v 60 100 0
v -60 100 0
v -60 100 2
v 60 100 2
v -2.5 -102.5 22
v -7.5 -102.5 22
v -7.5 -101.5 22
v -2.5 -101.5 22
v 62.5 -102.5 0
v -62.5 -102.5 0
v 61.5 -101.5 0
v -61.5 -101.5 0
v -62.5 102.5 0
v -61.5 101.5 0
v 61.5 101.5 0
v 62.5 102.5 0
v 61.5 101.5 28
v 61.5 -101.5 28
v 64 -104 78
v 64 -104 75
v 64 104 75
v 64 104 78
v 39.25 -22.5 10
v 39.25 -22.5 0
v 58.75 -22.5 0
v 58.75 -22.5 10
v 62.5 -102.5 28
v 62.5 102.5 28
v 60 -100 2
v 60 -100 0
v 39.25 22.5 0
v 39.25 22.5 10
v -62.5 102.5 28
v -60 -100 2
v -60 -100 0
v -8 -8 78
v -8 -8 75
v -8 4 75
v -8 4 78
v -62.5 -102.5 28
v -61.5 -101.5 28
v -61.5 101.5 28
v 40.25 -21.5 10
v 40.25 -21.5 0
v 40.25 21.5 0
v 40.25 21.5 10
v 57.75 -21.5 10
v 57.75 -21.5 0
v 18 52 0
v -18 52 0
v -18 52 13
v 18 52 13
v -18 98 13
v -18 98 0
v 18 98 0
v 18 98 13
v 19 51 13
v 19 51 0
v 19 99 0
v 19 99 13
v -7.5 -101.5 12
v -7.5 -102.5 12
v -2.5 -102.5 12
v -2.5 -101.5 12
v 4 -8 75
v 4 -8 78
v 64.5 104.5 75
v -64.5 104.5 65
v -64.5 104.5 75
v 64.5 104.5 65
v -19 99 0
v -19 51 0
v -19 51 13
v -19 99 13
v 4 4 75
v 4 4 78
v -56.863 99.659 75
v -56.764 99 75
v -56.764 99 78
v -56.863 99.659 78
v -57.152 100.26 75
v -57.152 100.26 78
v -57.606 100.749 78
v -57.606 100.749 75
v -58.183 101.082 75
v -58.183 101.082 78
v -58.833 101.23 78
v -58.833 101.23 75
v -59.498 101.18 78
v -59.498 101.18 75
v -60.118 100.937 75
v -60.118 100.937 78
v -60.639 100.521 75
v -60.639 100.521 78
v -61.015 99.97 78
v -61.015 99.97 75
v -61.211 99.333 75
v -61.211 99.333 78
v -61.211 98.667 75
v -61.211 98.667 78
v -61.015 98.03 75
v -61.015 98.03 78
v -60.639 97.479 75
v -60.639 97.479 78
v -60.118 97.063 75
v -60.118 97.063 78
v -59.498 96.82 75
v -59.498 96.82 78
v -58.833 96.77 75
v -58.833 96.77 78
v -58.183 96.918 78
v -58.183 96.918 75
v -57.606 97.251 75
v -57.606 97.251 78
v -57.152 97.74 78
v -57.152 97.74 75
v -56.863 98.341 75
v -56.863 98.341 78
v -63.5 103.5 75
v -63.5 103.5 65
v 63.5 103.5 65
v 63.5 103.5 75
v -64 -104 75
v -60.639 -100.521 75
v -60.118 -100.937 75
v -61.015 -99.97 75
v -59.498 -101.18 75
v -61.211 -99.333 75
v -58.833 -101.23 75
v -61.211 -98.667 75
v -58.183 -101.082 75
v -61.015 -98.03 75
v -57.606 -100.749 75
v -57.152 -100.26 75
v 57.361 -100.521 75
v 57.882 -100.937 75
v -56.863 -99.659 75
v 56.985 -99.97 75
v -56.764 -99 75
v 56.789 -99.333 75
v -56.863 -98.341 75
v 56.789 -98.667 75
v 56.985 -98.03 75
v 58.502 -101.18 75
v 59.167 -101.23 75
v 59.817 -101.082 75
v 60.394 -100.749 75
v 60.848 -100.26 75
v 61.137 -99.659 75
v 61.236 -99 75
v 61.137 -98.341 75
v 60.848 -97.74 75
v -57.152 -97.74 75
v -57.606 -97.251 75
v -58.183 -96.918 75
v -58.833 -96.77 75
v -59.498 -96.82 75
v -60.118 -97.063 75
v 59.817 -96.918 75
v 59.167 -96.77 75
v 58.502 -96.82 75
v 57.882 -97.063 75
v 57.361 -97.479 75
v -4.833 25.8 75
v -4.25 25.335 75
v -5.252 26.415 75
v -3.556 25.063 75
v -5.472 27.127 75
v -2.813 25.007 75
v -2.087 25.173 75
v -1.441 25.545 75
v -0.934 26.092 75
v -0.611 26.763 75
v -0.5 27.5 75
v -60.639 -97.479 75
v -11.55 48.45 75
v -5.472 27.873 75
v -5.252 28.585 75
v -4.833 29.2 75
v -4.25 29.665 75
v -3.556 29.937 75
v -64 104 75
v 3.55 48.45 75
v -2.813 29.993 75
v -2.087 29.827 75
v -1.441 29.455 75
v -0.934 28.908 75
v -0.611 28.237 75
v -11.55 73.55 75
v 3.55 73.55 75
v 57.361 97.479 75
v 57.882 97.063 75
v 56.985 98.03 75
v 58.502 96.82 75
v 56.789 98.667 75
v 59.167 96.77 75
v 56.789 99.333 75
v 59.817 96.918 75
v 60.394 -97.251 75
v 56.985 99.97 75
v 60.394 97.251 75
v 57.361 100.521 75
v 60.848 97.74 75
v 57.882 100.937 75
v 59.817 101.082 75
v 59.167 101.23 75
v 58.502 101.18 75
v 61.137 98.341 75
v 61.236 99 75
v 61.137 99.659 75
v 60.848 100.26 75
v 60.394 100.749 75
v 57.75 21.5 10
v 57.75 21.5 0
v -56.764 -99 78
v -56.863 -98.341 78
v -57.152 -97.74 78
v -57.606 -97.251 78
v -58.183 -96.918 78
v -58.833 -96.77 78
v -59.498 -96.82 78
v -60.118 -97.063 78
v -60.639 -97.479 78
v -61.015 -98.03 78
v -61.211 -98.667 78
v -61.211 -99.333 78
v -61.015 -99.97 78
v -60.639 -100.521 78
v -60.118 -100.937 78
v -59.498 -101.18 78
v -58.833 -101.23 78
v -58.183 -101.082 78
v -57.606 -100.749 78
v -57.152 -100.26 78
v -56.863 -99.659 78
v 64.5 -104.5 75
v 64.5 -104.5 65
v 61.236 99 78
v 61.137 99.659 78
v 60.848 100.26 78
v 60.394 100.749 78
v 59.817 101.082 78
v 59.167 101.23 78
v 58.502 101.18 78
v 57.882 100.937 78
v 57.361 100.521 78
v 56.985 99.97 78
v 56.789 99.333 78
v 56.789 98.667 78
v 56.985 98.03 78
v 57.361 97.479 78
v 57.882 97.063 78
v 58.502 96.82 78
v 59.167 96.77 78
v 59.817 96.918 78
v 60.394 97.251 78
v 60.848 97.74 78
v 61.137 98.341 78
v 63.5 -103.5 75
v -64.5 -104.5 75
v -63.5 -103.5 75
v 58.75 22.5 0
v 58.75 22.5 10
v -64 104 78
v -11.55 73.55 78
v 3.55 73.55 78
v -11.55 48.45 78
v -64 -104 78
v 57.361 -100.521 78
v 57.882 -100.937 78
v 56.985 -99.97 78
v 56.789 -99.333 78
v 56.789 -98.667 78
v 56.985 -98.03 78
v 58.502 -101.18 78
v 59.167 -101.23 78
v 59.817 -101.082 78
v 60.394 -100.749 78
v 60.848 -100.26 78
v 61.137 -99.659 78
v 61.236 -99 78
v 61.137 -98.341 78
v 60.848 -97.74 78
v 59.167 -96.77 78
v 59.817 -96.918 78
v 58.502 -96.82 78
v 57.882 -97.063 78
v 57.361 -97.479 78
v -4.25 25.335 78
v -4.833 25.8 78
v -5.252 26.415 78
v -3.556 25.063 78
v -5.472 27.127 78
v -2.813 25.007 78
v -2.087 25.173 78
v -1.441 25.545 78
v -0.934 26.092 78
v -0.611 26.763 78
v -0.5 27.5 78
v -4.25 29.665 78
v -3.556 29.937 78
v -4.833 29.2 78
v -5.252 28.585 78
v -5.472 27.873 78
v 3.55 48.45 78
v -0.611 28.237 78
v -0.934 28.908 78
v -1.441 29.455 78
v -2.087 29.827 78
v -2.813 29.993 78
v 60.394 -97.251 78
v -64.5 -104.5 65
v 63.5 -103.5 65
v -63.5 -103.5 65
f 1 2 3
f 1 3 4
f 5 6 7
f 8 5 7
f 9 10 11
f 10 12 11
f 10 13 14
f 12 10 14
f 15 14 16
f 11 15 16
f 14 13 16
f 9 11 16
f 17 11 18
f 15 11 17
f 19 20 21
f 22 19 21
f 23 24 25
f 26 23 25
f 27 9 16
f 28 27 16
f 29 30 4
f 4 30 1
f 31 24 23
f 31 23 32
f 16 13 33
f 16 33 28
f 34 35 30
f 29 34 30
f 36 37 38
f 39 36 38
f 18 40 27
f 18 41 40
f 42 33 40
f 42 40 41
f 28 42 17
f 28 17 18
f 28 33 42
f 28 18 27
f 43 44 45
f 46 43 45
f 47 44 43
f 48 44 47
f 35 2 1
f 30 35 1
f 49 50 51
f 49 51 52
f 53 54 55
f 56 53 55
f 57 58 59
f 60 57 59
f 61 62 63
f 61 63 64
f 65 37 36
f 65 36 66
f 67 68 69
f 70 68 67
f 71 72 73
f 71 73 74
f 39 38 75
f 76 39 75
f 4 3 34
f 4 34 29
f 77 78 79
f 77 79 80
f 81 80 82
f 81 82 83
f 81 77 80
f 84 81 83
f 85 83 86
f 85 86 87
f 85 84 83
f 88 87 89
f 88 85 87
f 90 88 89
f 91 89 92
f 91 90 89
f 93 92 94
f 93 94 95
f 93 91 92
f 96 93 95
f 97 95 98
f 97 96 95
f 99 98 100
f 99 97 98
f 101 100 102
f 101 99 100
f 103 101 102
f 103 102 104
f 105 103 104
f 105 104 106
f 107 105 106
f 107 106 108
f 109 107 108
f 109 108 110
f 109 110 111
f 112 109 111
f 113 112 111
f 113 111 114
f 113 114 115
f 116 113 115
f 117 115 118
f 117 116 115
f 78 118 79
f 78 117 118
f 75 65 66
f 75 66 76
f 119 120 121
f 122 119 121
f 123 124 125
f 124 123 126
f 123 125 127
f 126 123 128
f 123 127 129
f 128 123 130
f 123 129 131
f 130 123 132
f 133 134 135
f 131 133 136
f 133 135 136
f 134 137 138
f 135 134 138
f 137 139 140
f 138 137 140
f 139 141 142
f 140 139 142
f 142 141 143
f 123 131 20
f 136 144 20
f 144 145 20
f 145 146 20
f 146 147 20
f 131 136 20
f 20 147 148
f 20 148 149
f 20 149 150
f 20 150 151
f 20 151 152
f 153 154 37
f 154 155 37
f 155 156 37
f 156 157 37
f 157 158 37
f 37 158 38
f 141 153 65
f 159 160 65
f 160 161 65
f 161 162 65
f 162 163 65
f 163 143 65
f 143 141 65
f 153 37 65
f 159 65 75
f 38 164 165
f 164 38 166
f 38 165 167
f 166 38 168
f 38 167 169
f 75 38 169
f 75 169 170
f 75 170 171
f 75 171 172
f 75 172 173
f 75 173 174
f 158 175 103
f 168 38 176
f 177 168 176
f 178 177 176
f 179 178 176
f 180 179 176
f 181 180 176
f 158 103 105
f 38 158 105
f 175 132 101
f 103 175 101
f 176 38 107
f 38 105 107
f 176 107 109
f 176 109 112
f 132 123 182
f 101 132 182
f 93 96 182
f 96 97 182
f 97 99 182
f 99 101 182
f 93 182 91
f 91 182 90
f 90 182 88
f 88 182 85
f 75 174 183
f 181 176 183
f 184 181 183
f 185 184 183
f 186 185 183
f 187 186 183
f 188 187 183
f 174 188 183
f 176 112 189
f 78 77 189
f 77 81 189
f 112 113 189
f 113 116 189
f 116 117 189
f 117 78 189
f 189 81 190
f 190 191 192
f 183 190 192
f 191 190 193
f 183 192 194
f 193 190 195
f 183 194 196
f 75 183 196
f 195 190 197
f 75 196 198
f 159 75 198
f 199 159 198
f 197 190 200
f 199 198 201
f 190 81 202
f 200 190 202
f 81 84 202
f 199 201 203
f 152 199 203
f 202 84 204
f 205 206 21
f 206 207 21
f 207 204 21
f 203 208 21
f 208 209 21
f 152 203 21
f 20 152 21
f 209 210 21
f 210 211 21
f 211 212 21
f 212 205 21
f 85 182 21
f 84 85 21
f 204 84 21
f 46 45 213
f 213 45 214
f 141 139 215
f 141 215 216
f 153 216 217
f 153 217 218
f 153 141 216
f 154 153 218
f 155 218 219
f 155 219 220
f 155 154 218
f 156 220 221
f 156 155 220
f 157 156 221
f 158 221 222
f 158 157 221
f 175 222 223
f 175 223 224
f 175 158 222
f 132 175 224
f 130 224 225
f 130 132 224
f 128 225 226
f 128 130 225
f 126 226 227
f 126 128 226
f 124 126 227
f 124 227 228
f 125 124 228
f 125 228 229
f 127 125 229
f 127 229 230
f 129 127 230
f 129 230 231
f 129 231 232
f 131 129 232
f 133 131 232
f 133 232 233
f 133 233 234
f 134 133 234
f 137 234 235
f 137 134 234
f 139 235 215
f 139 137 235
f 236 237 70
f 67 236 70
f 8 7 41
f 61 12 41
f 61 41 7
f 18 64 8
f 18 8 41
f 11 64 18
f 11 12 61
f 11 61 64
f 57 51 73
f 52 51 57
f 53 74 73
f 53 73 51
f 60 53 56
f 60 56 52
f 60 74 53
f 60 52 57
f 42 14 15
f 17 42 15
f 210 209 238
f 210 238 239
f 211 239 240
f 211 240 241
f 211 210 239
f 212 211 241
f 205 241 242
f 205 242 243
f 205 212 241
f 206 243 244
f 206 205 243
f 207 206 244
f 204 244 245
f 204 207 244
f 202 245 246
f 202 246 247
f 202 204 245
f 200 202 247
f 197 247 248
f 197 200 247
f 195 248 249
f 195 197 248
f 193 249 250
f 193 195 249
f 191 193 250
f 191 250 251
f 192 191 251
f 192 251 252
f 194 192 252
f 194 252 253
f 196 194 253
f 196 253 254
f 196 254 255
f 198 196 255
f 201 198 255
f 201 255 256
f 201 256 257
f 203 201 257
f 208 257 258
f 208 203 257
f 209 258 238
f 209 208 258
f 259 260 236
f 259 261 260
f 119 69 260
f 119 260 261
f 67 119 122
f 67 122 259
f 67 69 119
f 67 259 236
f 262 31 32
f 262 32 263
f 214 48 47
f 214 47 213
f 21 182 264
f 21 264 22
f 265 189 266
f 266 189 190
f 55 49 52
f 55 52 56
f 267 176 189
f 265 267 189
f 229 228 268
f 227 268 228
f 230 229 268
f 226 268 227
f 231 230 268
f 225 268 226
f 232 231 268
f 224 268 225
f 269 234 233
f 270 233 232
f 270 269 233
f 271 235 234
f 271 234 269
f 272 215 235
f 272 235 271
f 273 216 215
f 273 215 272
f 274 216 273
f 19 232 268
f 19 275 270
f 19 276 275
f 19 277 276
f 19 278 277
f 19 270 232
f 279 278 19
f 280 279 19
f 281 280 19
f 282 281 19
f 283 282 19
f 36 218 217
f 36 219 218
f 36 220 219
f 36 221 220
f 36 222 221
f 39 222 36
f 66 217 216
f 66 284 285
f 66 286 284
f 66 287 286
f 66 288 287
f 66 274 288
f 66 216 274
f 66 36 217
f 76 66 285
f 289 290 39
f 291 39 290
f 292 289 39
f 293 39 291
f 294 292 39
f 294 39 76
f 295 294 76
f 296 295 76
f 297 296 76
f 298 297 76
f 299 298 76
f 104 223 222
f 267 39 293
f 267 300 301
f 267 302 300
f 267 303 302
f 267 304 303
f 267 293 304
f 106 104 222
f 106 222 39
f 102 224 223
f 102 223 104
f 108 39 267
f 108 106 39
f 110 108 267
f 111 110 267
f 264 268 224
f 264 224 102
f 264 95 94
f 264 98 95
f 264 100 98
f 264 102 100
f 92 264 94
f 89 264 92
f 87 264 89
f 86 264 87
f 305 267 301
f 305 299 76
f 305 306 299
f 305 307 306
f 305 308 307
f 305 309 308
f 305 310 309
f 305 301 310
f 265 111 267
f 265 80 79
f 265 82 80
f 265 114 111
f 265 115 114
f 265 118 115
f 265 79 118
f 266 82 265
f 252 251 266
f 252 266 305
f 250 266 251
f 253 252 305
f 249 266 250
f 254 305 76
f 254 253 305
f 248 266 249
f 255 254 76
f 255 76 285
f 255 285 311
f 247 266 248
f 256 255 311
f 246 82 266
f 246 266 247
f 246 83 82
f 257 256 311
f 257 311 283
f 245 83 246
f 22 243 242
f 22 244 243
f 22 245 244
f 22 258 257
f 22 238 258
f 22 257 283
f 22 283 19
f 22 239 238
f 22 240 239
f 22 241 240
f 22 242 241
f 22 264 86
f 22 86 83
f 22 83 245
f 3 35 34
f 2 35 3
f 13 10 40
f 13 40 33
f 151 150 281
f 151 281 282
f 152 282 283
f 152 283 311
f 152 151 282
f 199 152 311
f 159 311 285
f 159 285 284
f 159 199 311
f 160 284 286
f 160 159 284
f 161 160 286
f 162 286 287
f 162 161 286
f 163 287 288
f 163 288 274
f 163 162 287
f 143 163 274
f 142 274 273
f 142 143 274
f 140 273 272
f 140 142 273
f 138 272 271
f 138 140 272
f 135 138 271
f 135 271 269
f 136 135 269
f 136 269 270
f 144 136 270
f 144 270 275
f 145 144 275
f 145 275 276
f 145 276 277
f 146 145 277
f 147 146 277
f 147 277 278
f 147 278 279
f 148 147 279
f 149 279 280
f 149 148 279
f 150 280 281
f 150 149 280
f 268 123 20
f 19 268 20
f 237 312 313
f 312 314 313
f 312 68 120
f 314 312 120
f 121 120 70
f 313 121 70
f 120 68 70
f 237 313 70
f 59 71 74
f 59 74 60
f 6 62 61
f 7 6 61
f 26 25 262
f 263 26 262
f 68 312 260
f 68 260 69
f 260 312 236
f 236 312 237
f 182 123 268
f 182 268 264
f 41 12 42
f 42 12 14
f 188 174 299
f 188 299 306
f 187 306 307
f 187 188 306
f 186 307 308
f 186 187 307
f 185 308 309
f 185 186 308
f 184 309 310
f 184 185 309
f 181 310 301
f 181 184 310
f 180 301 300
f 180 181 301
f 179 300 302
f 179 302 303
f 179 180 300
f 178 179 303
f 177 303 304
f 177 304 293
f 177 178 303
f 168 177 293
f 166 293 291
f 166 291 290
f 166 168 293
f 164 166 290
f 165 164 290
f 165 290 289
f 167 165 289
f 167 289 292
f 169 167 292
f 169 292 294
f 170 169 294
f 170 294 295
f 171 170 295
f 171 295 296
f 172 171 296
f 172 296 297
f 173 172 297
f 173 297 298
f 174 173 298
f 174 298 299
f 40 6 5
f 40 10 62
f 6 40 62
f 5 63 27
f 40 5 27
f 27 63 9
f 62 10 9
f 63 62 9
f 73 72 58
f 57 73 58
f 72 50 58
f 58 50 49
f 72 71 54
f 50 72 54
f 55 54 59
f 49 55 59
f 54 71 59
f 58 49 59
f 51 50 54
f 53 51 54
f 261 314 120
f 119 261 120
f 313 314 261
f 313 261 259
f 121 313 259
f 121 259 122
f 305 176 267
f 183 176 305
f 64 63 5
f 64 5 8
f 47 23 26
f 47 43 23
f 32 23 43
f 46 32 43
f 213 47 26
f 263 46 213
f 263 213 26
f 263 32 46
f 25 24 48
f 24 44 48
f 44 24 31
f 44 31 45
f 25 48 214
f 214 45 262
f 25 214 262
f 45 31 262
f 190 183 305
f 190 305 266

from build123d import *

# Parameters (mm, degrees)
SKETCH_W                = 38
SKETCH_H                = 48
SKETCH_W_2              = 36
SKETCH_H_2              = 46
PAD_DEPTH               = 13
SKETCH001_W             = 120
SKETCH001_H             = 200
PAD001_DEPTH            = 2
SKETCH003_W             = 19.5
SKETCH003_H             = 45
SKETCH003_W_2           = 17.5
SKETCH003_H_2           = 43
PAD002_DEPTH            = 10
SKETCH006_W             = 1
SKETCH006_H             = 5
PAD005_DEPTH            = 10
BODY007_PLACEMENT_ANGLE = 90
SKETCH004_W             = 125
SKETCH004_H             = 205
SKETCH004_W_2           = 123
SKETCH004_H_2           = 203
PAD003_DEPTH            = 28
SKETCH007_W             = 129
SKETCH007_H             = 209
SKETCH007_W_2           = 127
SKETCH007_H_2           = 207
PAD006_DEPTH            = 10
SKETCH011_R             = 2.5
PAD010_DEPTH            = 10
SKETCH010_W             = 12
SKETCH010_H             = 12
PAD009_DEPTH            = 10
SKETCH009_W             = 15.1
SKETCH009_H             = 25.1
PAD008_DEPTH            = 3
SKETCH008_W             = 128
SKETCH008_H             = 208
SKETCH008_R             = 2.236466
PAD007_DEPTH            = 3


with BuildPart() as body:
    # Sketch → Pad (new body)
    with BuildSketch(Plane.XY):
        Rectangle(SKETCH_W, SKETCH_H)
        Rectangle(SKETCH_W_2, SKETCH_H_2, mode=Mode.SUBTRACT)
    extrude(amount=PAD_DEPTH)


with BuildPart() as body_1:
    # Body placement: moved
    add(body.part.moved(Location((0, 75, 0))))


with BuildPart() as flor:
    # Sketch001 → Pad001 (new body)
    with BuildSketch(Plane.XY):
        Rectangle(SKETCH001_W, SKETCH001_H)
    extrude(amount=PAD001_DEPTH)


with BuildPart() as relay:
    # Sketch003 → Pad002 (new body)
    with BuildSketch(Plane.XY):
        Rectangle(SKETCH003_W, SKETCH003_H)
        Rectangle(SKETCH003_W_2, SKETCH003_H_2, mode=Mode.SUBTRACT)
    extrude(amount=PAD002_DEPTH)


with BuildPart() as relay_1:
    # Body004 placement: moved
    add(relay.part.moved(Location((49, 0, 0))))


with BuildPart() as body007:
    # Sketch006 → Pad005 (new body)
    with BuildSketch(Plane.XY):
        Rectangle(SKETCH006_W, SKETCH006_H)
    extrude(amount=PAD005_DEPTH)


with BuildPart() as body007_1:
    # Body007 placement: moved
    add(body007.part.moved(Location((-5, -102, 12))).rotate(Axis((-5, -102, 12), (0, 0, 1)), BODY007_PLACEMENT_ANGLE))


with BuildPart() as cut:
    # Sketch004 → Pad003 (new body)
    with BuildSketch(Plane.XY):
        Rectangle(SKETCH004_W, SKETCH004_H)
        Rectangle(SKETCH004_W_2, SKETCH004_H_2, mode=Mode.SUBTRACT)
    extrude(amount=PAD003_DEPTH)

    # Cut: cut Body007
    add(body007_1.part, mode=Mode.SUBTRACT)


with BuildPart() as box_lid:
    # Sketch007 → Pad006 (new body)
    with BuildSketch(Plane.XY):
        Rectangle(SKETCH007_W, SKETCH007_H)
        Rectangle(SKETCH007_W_2, SKETCH007_H_2, mode=Mode.SUBTRACT)
    extrude(amount=PAD006_DEPTH)


with BuildPart() as box_lid_1:
    # Body008 placement: moved
    add(box_lid.part.moved(Location((0, 0, 65))))


with BuildPart() as body012:
    # Sketch011 → Pad010 (new body)
    with BuildSketch(Plane.XY):
        with Locations((0, 0.5)):
            Circle(SKETCH011_R)
    extrude(amount=PAD010_DEPTH)


with BuildPart() as body012_1:
    # Body012 placement: moved
    add(body012.part.moved(Location((-3, 27, 68))))


with BuildPart() as body011:
    # Sketch010 → Pad009 (new body)
    with BuildSketch(Plane.XY):
        Rectangle(SKETCH010_W, SKETCH010_H)
    extrude(amount=PAD009_DEPTH)


with BuildPart() as body011_1:
    # Body011 placement: moved
    add(body011.part.moved(Location((-2, -2, 68))))


with BuildPart() as dht22:
    # Sketch009 → Pad008 (new body)
    with BuildSketch(Plane.XY):
        Rectangle(SKETCH009_W, SKETCH009_H)
    extrude(amount=PAD008_DEPTH)


with BuildPart() as dht22_1:
    # Body010 placement: moved
    add(dht22.part.moved(Location((-4, 61, 75))))


with BuildPart() as cut003:
    # Sketch008 → Pad007 (new body)
    with BuildSketch(Plane.XY):
        Rectangle(SKETCH008_W, SKETCH008_H)
        with Locations((-59, 99)):
            Circle(SKETCH008_R, mode=Mode.SUBTRACT)
        with Locations((59, 99)):
            Circle(SKETCH008_R, mode=Mode.SUBTRACT)
        with Locations((-59, -99)):
            Circle(SKETCH008_R, mode=Mode.SUBTRACT)
        with Locations((59, -99)):
            Circle(SKETCH008_R, mode=Mode.SUBTRACT)
    extrude(amount=PAD007_DEPTH)


with BuildPart() as cut003_1:
    # Body009 placement: moved
    add(cut003.part.moved(Location((0, 0, 75))))

    # Cut001: cut dht22
    add(dht22_1.part, mode=Mode.SUBTRACT)

    # Cut002: cut Body011
    add(body011_1.part, mode=Mode.SUBTRACT)

    # Cut003: cut Body012
    add(body012_1.part, mode=Mode.SUBTRACT)


solid = Compound([body_1.part, flor.part, relay_1.part, cut.part, box_lid_1.part, cut003_1.part])
